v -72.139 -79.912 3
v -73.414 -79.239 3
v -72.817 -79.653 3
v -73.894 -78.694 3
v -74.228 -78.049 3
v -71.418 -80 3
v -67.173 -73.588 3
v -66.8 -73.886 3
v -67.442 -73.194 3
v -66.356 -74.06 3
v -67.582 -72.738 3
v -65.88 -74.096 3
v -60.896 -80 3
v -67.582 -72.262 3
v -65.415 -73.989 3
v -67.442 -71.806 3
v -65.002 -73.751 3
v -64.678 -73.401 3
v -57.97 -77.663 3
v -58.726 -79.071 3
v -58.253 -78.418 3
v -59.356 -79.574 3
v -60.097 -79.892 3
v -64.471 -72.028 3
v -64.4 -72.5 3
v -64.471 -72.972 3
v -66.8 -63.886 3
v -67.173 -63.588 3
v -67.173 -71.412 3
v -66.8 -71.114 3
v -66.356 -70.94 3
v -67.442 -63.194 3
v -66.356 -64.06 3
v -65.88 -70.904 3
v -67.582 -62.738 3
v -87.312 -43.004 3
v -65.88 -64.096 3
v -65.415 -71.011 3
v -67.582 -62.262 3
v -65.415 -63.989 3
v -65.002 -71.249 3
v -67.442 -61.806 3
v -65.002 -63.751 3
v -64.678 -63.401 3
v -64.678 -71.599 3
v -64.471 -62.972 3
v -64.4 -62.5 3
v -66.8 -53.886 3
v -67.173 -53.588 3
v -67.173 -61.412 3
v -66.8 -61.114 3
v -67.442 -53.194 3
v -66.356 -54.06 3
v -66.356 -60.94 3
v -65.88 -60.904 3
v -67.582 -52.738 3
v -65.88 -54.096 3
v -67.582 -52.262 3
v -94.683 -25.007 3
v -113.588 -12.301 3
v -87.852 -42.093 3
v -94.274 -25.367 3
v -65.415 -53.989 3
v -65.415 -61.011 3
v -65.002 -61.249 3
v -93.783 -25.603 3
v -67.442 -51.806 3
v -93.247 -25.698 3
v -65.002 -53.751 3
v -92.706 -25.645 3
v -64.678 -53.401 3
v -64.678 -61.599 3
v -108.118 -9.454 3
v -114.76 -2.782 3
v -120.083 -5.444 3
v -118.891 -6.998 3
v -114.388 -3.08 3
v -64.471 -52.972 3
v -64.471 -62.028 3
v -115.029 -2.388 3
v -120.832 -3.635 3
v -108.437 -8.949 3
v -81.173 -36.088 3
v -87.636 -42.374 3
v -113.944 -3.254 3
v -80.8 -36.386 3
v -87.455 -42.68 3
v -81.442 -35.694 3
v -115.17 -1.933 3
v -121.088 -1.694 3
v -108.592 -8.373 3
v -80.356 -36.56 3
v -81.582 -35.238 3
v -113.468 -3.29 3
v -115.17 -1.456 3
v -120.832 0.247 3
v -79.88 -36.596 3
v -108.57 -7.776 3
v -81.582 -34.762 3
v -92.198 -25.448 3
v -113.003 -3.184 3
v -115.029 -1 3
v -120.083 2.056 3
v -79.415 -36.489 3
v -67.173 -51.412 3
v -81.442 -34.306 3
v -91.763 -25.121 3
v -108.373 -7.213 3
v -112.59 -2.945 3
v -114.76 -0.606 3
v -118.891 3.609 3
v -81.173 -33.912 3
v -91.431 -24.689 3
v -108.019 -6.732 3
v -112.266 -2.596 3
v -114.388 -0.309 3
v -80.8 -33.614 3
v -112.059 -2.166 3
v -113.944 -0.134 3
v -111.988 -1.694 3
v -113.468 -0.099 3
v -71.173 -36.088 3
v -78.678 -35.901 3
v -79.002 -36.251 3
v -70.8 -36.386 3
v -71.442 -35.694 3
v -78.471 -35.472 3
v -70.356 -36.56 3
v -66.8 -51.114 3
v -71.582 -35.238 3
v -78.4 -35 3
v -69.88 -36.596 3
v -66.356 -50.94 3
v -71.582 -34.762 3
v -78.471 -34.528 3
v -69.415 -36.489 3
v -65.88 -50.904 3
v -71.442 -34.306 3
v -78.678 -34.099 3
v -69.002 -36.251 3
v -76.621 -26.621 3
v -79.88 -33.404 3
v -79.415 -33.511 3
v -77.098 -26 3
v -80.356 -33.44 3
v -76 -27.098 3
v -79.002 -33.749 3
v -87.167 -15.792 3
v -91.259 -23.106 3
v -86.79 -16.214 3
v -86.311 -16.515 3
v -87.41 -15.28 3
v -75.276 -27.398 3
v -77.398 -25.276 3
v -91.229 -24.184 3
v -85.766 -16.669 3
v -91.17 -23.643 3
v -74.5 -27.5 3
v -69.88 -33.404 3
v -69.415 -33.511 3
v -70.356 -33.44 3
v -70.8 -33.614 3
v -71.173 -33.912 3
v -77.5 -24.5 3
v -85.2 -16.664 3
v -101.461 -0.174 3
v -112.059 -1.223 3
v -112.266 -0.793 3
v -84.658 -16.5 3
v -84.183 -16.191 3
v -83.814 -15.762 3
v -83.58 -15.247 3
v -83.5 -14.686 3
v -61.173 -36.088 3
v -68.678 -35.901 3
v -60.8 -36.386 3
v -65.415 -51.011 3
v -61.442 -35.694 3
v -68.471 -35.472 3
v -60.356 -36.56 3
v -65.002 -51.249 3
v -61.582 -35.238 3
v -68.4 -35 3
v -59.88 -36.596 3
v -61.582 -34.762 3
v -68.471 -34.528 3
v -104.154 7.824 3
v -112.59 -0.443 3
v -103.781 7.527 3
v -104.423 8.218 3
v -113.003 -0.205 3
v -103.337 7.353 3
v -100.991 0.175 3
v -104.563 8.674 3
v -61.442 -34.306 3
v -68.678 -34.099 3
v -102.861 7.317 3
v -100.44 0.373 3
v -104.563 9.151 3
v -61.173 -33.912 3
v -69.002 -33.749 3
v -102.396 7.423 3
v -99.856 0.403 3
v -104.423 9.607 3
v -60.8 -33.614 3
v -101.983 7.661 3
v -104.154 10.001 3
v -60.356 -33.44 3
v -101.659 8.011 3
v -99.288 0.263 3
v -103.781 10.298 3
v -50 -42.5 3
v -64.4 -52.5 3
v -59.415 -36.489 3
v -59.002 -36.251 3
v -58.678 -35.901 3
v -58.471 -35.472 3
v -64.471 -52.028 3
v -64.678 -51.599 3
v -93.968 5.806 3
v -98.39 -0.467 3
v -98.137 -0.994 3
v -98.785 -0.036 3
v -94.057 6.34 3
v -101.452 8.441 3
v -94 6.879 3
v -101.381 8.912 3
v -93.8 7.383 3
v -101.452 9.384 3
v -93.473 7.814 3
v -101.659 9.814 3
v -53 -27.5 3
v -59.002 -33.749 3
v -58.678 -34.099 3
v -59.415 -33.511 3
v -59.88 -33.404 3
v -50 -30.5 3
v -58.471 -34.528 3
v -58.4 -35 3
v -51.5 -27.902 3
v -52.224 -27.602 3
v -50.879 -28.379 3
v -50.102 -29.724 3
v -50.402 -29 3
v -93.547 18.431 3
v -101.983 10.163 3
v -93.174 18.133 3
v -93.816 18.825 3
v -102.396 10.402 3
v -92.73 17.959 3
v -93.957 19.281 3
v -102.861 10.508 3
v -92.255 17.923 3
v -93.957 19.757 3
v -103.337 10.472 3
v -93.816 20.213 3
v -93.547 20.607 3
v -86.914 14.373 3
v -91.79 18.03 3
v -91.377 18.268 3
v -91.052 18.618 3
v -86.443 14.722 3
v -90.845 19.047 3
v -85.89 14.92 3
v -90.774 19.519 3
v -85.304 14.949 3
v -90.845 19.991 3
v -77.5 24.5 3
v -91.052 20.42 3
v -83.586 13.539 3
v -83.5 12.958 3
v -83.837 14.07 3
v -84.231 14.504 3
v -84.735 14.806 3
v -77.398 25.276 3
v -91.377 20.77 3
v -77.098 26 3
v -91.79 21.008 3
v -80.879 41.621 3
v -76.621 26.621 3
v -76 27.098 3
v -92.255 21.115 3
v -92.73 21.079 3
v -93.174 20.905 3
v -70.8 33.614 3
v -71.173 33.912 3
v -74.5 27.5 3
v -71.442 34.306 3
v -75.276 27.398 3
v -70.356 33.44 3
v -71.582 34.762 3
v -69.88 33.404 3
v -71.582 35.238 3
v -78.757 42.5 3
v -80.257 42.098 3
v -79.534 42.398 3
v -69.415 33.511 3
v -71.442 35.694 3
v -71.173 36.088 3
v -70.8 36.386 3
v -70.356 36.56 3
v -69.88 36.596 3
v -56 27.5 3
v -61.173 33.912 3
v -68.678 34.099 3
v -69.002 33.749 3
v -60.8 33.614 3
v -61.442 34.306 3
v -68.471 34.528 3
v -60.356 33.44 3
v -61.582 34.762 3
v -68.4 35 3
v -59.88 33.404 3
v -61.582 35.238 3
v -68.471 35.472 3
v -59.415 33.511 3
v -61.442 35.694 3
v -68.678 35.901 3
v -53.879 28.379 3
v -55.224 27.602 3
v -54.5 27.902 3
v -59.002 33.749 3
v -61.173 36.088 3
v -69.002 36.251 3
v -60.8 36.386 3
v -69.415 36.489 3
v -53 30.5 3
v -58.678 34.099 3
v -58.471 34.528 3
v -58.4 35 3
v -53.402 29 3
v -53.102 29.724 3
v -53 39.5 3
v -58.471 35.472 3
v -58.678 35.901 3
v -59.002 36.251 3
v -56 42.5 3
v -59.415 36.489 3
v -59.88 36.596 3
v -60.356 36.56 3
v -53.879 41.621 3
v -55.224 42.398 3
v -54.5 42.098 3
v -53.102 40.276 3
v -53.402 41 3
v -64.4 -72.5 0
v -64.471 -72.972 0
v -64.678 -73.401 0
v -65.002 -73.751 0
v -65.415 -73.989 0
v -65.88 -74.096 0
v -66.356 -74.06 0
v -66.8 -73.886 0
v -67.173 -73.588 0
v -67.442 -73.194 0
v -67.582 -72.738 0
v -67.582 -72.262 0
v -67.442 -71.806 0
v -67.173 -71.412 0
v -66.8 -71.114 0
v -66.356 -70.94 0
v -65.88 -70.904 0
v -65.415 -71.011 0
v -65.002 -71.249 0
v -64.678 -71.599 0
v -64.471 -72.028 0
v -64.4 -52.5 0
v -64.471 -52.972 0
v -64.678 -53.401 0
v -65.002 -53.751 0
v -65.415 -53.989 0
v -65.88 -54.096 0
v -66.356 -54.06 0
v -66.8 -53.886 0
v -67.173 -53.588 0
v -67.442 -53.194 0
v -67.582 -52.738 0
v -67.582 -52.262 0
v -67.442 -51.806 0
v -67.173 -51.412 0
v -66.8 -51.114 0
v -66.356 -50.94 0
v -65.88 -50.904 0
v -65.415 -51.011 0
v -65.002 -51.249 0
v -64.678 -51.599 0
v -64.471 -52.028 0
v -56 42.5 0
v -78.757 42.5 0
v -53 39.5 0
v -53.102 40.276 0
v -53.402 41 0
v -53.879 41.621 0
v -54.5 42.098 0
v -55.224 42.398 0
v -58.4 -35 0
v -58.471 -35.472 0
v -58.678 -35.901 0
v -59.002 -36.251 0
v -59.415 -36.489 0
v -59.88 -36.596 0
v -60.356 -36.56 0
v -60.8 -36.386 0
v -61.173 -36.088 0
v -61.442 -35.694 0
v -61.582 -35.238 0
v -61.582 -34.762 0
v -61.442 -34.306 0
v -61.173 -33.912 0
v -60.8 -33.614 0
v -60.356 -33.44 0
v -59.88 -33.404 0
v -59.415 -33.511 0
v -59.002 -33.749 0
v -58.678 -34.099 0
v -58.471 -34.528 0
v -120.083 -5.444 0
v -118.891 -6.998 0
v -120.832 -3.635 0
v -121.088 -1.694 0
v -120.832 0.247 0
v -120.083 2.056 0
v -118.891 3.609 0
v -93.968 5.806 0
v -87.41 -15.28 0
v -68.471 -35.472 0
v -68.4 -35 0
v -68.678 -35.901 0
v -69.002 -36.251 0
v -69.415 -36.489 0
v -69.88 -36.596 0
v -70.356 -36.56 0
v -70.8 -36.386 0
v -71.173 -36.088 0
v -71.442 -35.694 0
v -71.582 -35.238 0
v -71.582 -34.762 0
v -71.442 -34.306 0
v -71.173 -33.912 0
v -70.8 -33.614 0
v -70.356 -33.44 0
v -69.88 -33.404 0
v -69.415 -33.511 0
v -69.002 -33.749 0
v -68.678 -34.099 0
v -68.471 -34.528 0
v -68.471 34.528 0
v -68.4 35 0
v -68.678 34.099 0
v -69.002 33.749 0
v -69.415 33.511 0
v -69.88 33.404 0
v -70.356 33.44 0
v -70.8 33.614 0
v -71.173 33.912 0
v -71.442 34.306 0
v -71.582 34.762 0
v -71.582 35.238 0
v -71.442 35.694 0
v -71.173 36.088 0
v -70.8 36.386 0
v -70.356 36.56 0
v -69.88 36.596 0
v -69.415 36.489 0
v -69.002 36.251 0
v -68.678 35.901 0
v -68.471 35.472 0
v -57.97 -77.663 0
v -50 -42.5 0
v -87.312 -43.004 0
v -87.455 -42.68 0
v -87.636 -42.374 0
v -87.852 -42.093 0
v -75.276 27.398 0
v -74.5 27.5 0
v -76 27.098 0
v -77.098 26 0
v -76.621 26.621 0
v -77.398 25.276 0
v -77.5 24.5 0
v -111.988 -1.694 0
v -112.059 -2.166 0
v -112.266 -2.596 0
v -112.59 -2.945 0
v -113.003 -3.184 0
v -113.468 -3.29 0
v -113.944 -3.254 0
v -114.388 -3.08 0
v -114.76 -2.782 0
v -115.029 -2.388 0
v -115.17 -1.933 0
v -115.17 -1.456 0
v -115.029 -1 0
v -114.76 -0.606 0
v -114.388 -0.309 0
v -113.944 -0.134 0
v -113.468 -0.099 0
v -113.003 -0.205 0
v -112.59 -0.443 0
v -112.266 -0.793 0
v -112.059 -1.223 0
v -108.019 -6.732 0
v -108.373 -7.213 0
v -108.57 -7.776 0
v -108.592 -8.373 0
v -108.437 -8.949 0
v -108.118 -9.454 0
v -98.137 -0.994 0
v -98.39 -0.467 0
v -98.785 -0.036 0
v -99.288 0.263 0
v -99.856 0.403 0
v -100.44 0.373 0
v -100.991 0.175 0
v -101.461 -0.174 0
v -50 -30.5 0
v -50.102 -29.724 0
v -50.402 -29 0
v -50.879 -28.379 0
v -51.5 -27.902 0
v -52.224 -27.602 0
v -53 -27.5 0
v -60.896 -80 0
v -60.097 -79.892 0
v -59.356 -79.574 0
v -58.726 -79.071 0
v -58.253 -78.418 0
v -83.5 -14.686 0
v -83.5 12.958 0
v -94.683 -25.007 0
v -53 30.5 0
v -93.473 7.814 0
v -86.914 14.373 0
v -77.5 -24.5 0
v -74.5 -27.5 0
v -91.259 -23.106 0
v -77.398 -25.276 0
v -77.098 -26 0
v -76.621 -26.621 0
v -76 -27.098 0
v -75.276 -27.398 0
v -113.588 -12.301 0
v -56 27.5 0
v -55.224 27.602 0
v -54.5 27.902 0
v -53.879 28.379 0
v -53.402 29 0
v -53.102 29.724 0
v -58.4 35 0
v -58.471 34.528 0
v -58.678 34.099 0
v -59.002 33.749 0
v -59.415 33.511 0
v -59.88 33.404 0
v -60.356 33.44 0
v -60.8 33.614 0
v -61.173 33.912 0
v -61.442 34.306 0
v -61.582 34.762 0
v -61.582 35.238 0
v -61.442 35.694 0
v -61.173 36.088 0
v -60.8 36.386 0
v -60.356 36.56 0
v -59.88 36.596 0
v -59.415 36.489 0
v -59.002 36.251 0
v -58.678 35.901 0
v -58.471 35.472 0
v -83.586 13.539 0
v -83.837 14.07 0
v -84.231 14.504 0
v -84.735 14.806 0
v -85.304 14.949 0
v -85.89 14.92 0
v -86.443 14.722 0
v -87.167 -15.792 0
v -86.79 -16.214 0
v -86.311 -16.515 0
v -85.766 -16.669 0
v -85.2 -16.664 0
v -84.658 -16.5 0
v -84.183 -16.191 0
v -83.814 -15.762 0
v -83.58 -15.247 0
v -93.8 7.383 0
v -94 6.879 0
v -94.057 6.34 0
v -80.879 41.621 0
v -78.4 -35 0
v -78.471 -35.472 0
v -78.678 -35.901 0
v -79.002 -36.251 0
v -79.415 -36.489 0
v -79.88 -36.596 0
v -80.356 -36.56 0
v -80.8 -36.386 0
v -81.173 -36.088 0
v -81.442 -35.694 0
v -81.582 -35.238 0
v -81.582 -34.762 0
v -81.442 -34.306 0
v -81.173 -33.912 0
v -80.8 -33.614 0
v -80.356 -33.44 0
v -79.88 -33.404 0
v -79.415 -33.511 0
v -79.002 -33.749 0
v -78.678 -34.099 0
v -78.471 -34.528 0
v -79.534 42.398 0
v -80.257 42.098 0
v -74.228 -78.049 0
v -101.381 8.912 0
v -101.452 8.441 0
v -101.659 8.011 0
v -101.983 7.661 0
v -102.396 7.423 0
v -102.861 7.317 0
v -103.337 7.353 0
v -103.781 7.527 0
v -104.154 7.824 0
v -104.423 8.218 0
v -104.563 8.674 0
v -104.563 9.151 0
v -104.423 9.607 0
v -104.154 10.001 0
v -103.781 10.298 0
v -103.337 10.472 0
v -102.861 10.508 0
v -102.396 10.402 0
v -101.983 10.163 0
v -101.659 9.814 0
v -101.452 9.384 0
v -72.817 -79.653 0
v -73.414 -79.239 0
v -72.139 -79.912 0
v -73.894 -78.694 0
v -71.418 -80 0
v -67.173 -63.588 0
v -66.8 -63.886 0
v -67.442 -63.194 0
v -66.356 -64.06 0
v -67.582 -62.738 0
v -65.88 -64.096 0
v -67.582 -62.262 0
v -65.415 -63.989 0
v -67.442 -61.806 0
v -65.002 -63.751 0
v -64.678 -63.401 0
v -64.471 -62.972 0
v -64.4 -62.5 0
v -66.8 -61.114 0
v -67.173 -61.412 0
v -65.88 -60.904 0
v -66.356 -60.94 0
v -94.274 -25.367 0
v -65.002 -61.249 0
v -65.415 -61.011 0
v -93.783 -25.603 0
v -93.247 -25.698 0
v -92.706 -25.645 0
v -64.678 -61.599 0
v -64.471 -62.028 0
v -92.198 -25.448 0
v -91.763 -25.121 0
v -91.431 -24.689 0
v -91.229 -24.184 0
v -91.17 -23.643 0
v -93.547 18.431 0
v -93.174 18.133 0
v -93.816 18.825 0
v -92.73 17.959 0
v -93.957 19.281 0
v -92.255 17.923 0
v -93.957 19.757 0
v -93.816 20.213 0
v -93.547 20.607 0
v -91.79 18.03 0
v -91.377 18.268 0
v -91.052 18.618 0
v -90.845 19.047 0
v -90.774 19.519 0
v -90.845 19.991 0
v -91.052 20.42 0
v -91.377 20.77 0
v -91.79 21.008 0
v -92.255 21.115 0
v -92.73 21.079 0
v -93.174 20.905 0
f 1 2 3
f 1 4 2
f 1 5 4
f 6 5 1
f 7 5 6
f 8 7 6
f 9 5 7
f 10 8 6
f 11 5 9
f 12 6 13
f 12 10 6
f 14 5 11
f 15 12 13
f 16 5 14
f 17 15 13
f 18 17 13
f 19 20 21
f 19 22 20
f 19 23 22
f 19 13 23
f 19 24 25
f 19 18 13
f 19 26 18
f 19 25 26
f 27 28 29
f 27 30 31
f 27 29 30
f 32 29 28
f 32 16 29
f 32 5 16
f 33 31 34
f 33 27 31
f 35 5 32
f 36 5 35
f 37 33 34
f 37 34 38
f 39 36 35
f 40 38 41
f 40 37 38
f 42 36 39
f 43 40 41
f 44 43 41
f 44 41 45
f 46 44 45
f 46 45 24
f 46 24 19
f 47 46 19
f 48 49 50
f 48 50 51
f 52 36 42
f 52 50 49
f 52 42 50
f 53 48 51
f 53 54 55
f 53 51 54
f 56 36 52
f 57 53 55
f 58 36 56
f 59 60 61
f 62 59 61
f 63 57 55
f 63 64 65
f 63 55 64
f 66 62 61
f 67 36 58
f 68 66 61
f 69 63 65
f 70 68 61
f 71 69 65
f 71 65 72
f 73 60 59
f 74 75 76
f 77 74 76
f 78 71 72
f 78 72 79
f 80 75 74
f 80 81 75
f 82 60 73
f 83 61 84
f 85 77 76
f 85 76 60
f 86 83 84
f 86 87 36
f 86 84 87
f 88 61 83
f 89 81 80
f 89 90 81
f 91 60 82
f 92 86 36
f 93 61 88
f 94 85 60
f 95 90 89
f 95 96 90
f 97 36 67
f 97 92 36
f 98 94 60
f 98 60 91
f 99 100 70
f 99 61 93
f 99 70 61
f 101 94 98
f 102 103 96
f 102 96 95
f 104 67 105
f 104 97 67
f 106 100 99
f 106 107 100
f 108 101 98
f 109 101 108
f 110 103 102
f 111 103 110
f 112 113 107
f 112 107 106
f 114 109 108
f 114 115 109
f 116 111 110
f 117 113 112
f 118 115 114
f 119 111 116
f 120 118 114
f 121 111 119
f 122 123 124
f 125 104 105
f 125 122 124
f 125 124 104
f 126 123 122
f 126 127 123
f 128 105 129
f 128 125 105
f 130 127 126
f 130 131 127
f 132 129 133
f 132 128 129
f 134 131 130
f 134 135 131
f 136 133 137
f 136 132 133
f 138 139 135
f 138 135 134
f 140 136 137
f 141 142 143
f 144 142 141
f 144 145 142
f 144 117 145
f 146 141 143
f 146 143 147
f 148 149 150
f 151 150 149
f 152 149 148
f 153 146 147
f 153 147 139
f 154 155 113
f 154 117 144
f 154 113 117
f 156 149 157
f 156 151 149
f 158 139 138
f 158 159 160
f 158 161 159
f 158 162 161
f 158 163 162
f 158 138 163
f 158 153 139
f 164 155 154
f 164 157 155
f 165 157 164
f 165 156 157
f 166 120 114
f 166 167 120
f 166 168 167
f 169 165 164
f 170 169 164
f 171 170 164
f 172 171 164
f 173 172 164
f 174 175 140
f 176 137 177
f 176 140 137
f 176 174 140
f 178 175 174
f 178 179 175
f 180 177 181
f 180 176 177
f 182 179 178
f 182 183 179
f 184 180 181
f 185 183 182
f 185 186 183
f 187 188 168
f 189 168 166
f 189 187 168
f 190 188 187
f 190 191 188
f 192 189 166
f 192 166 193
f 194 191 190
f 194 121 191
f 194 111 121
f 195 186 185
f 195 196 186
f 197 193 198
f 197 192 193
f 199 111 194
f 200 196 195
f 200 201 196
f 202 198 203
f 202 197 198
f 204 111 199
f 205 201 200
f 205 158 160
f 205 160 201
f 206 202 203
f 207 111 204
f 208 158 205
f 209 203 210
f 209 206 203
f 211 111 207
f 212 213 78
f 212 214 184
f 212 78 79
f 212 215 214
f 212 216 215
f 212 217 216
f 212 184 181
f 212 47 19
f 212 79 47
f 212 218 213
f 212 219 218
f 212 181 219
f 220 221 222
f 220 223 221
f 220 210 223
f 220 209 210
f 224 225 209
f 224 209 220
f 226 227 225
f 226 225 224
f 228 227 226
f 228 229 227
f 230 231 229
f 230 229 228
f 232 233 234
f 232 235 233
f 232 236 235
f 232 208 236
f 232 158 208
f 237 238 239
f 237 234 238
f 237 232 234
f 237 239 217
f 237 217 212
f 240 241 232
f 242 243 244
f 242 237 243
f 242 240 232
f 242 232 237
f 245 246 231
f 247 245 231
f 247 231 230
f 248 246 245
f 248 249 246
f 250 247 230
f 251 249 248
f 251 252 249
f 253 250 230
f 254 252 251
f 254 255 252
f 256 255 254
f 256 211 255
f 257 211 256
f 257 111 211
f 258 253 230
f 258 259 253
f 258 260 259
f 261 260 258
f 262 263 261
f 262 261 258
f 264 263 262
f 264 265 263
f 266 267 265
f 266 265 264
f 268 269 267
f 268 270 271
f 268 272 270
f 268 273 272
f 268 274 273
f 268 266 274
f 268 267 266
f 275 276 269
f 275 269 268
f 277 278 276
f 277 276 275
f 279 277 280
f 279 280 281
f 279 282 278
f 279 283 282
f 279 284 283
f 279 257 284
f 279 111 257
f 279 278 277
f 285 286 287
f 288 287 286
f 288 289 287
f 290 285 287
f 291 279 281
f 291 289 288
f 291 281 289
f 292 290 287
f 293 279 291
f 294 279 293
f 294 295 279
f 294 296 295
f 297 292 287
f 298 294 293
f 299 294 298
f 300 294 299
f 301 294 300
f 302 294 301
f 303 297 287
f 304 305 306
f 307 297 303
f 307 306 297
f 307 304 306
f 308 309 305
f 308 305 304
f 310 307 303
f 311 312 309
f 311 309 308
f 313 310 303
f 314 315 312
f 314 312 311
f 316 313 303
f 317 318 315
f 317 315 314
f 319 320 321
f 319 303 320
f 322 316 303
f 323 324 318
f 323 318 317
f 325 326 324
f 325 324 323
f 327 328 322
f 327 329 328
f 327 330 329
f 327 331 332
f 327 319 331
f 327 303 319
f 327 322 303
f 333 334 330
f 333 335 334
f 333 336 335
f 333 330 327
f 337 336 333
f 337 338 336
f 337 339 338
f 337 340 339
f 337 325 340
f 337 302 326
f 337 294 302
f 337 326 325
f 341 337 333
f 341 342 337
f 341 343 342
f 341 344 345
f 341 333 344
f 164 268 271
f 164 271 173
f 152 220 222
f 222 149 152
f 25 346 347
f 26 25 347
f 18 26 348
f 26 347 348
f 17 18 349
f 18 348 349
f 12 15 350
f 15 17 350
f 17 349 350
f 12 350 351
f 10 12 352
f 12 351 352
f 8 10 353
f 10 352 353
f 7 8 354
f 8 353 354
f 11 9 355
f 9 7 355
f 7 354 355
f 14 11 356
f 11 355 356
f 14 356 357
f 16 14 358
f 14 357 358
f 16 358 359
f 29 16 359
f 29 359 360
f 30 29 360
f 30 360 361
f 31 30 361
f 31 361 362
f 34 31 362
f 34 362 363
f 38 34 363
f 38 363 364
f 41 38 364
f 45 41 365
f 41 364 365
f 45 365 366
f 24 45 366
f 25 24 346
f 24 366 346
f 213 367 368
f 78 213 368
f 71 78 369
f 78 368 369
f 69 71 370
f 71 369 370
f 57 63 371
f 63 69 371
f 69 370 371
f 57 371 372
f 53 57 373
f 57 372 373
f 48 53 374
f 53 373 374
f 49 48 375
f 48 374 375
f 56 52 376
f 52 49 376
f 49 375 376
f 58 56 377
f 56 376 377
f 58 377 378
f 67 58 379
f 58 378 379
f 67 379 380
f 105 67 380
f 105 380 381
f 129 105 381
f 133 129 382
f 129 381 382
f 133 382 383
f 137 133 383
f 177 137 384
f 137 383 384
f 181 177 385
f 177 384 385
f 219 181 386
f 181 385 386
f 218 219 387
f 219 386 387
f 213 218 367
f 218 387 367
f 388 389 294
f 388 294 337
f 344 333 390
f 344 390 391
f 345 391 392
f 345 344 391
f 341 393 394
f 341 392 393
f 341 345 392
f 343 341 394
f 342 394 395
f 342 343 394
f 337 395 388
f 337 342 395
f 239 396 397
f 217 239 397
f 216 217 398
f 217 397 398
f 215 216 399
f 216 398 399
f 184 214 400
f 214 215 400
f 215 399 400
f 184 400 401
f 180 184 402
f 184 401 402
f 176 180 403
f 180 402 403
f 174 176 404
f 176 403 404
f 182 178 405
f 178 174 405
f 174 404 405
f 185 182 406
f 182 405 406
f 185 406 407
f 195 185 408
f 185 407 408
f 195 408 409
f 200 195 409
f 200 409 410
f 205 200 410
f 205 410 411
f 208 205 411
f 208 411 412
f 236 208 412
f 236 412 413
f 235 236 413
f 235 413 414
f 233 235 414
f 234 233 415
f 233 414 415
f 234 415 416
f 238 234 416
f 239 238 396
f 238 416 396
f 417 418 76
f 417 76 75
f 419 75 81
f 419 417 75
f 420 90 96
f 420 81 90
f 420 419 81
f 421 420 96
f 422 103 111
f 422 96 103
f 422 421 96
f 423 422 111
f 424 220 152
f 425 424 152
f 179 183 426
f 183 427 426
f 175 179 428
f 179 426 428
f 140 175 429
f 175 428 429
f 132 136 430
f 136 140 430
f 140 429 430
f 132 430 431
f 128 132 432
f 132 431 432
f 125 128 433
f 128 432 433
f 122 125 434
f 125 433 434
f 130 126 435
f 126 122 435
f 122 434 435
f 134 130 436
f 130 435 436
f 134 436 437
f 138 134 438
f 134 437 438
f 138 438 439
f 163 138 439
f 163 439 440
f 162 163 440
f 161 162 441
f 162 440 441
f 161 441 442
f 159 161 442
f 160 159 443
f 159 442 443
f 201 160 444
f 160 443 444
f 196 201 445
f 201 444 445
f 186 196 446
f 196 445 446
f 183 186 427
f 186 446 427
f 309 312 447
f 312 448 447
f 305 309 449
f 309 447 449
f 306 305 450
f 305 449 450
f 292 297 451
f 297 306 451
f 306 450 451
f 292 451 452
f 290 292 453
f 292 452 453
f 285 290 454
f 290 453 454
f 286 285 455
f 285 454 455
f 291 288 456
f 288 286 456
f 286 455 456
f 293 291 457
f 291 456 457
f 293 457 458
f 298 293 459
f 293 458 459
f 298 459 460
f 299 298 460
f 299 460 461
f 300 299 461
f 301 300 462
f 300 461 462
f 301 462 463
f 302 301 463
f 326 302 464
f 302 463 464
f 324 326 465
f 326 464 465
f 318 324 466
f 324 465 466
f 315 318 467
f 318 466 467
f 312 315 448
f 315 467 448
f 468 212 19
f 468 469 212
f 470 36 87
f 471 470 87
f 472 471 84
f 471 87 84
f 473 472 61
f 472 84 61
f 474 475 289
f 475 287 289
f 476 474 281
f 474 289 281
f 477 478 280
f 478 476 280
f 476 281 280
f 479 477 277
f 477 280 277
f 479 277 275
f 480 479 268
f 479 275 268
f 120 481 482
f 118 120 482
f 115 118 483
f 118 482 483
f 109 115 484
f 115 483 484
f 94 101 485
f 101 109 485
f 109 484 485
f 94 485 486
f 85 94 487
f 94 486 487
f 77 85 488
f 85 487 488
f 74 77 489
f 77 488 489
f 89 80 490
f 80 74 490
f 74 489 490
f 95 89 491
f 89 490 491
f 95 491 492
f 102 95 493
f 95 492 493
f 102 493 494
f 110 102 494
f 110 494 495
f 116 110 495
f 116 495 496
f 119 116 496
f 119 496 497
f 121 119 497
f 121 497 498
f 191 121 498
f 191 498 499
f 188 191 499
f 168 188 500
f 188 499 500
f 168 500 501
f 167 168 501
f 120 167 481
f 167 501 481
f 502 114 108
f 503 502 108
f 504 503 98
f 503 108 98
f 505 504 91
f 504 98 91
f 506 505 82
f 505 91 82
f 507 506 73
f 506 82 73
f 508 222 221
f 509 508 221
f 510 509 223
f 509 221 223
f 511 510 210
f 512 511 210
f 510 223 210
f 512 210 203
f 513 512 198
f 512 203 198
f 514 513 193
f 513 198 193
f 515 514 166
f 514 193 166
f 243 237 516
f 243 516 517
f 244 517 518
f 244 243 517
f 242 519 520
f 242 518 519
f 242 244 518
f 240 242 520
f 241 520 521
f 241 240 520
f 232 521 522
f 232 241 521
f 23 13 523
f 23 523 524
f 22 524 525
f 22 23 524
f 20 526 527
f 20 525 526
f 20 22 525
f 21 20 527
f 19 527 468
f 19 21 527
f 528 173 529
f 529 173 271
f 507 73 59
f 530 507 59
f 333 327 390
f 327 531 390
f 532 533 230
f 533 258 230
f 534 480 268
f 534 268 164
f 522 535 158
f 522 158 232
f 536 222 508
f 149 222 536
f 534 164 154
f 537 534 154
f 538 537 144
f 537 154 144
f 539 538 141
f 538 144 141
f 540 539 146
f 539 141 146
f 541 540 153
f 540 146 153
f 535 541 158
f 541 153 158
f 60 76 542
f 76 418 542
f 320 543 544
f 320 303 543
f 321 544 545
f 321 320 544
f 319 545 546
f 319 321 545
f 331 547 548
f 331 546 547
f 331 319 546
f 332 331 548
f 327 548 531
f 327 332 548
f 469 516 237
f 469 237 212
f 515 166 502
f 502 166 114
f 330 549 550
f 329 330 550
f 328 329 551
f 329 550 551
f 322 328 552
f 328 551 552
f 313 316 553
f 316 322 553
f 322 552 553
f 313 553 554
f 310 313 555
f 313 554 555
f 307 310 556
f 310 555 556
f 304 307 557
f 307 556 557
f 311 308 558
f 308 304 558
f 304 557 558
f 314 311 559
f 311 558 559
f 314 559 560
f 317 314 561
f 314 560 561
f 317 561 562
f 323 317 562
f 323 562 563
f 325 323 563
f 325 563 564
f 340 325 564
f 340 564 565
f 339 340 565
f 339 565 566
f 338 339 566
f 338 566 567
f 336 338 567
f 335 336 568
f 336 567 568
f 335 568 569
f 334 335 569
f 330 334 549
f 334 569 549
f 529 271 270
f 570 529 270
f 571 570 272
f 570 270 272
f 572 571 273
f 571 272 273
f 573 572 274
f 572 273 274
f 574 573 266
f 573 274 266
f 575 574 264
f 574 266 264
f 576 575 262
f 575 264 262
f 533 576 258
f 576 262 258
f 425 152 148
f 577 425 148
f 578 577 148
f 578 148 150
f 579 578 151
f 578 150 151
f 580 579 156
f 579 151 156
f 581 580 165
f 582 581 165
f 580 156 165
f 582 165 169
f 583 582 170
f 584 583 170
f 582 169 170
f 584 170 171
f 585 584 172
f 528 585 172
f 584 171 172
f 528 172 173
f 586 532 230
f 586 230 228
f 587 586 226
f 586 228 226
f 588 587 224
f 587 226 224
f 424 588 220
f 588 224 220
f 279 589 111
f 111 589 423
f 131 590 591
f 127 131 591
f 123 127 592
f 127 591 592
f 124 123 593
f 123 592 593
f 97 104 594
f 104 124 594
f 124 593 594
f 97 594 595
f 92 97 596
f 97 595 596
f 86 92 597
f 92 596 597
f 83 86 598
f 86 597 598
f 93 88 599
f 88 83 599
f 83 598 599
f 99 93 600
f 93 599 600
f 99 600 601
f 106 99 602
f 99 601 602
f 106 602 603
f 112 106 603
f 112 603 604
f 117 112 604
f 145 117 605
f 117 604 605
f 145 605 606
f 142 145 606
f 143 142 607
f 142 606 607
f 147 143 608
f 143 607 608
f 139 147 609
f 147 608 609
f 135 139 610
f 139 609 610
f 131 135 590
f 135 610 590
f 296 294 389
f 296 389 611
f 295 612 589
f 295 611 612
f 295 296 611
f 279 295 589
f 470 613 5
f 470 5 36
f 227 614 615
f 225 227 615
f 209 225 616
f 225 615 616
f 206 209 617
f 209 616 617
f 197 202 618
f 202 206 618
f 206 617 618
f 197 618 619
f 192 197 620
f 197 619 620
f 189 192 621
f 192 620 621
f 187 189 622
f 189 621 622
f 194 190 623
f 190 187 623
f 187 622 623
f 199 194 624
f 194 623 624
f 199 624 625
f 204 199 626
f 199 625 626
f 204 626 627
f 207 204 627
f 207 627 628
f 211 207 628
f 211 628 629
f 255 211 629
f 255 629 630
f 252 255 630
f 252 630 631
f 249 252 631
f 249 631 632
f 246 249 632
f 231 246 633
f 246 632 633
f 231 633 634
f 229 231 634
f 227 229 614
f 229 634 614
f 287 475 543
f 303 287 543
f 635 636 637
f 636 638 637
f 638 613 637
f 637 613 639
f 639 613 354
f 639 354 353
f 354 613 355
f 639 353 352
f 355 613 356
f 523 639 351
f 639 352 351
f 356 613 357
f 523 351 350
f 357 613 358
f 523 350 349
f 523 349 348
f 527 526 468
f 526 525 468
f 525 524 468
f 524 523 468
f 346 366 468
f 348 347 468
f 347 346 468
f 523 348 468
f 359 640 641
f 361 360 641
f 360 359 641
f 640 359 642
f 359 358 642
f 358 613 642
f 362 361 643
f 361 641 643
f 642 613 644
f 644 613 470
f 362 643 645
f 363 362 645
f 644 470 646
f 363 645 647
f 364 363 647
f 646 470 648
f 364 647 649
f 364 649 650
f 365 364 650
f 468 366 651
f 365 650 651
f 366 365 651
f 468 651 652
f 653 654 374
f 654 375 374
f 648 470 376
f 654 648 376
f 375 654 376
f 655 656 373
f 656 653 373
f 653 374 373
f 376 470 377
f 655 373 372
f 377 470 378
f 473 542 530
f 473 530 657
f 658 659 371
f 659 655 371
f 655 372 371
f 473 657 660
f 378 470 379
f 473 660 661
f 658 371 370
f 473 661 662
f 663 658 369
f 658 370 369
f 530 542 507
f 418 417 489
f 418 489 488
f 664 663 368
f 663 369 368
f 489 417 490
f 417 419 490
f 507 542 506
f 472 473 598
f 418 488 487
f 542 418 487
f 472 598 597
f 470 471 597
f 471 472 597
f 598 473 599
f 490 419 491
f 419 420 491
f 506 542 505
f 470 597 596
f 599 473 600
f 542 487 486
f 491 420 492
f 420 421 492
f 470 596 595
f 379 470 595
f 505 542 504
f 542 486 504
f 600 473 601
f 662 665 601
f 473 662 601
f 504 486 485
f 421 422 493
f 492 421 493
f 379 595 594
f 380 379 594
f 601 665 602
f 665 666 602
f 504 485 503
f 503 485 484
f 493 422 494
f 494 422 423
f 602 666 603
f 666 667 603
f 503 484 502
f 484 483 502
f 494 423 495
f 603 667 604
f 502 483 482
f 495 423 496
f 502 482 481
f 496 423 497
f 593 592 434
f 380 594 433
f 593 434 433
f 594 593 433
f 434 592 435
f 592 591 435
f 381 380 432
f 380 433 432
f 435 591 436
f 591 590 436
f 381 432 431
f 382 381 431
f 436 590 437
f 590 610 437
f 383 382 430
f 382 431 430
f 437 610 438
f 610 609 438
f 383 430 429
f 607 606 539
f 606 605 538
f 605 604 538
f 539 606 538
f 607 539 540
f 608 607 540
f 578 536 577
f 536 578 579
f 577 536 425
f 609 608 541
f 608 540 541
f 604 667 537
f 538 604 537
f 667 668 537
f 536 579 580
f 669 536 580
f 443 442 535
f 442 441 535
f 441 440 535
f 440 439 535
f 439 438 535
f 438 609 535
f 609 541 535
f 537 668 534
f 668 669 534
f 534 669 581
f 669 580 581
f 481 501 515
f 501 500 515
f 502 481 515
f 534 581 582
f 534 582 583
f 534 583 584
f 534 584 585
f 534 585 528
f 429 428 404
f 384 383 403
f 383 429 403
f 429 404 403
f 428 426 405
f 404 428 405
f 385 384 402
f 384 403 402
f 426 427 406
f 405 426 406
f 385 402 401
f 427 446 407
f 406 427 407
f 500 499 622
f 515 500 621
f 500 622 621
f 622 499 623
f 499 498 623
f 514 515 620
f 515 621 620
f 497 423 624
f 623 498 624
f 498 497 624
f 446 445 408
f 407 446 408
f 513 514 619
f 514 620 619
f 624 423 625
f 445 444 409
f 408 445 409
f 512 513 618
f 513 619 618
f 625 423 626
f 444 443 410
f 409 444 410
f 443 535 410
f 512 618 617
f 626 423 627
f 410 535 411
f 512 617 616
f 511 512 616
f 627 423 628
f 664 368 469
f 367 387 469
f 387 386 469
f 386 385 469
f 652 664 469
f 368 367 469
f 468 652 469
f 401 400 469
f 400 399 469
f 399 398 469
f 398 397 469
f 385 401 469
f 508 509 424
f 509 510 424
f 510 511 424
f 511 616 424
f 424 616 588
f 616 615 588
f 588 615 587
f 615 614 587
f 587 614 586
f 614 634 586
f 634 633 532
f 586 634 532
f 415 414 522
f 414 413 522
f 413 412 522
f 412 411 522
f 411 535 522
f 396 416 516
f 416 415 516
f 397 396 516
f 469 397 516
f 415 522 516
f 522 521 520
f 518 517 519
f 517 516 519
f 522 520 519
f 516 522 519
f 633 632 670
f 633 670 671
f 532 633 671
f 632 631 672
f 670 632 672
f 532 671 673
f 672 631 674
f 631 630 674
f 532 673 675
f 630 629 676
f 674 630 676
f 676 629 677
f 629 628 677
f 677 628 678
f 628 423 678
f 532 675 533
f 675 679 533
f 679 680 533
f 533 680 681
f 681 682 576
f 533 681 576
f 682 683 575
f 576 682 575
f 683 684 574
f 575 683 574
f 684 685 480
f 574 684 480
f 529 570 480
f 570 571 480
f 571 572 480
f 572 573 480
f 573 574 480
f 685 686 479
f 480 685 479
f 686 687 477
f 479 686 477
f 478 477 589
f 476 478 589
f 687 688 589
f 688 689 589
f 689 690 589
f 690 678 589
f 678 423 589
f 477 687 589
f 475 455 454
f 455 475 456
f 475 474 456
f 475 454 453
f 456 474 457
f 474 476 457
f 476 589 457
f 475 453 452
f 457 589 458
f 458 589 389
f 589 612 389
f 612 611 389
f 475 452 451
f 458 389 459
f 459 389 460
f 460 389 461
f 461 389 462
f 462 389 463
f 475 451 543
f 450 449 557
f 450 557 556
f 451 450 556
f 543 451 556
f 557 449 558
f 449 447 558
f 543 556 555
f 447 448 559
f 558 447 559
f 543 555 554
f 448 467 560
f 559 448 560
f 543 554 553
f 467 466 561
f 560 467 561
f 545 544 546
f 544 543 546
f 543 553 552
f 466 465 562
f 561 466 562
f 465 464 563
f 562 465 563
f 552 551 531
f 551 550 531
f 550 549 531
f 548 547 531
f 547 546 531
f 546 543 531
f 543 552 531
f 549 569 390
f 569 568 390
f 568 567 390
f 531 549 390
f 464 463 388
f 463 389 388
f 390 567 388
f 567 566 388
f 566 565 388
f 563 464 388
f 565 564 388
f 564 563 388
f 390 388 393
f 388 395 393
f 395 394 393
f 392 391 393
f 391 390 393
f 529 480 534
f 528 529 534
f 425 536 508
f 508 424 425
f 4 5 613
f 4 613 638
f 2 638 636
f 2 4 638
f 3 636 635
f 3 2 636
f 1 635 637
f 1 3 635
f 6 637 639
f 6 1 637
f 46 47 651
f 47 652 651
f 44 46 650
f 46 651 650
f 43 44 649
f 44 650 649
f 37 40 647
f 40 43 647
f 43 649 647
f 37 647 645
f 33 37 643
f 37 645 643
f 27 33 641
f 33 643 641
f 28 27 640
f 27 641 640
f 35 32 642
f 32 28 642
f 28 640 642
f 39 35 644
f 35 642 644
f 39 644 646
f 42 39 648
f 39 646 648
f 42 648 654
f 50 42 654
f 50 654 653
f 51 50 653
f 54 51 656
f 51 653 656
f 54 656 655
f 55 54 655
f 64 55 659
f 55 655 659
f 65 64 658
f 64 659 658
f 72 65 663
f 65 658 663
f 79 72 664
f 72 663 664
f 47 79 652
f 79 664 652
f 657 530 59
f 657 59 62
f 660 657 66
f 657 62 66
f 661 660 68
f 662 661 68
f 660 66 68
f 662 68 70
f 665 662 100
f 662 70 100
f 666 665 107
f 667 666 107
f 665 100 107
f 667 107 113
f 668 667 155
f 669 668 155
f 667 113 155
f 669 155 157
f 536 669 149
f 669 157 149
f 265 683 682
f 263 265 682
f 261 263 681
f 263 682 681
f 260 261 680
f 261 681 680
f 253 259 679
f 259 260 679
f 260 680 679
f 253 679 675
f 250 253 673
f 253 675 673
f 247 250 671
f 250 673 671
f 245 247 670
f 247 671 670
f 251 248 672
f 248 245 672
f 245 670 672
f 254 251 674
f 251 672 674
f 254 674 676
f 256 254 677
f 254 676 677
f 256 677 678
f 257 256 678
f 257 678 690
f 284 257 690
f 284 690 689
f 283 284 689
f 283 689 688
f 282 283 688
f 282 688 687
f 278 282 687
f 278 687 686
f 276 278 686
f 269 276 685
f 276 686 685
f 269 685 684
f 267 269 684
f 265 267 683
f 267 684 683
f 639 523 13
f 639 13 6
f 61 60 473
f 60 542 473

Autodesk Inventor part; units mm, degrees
ref_plane "YZ Plane" through (0, 0, 0) normal (1, 0, 0) x (0, 1, 0)
ref_plane "XZ Plane" through (0, 0, 0) normal (0, 1, 0) x (-1, 0, 0)
ref_plane "XY Plane" through (0, 0, 0) normal (0, 0, 1) x (1, 0, 0)
sketch "スケッチ1" plane through (0, 0, 0) normal (0, 0, 1) x (1, 0, 0)
  line L0 (67.5, 17.5) -> (-67.5, 17.5) construction
  line L1 (-67.5, 17.5) -> (-67.5, -17.5) construction
  line L2 (-67.5, -17.5) -> (67.5, -17.5) construction
  line L3 (67.5, -17.5) -> (67.5, 17.5) construction
  line L4 (67.5, 17.5) -> (-67.5, -17.5) construction
  line L5 (-67.5, 17.5) -> (67.5, -17.5) construction
  circle A0 centre (-60, 35) radius 1.6
  circle A1 centre (-70, 35) radius 1.6
  line L6 (-77.5, 27.5) -> (-53, 27.5)
  line L7 (-53, 27.5) -> (-53, 42.5)
  line L8 (-53, 42.5) -> (-80, 42.5) construction
  line L9 (-77.5, 27.5) -> (-77.5, -27.5)
  line L10 (-77.5, -27.5) -> (-50, -27.5)
  circle A2 centre (-60, -35) radius 1.6
  circle A3 centre (-70, -35) radius 1.6
  circle A4 centre (-80, -35) radius 1.6
  line L11 (124.2308, -31.7536) -> (484.5935, -392.1164)
  line L12 (484.5935, -392.1164) -> (488.7129, -553.575)
  line L13 (-80, 21.2868) -> (-468.838, -367.5512) construction
  line L14 (-468.838, -367.5512) -> (-479.4446, -356.9446)
  line L15 (-479.4446, -356.9446) -> (-90.6066, 31.8934) construction
  line L16 (-90.6066, 31.8934) -> (-80, 21.2868) construction
  line L17 (-80, 42.5) -> (-80, 5.3052) construction
  circle A5 centre (-92.3744, 19.519) radius 1.6
  circle A6 centre (-102.981, 8.9124) radius 1.6
  circle A7 centre (-113.5876, -1.6942) radius 1.6
  line L18 (-92.3744, 19.519) -> (-113.5876, -1.6942) construction
  circle A8 centre (-433.75, -321.8566) radius 1.6
  circle A9 centre (-421.9492, -310.0558) radius 1.6
  line L19 (-388.4374, -772.2067) -> (-358.1265, -754.7067) construction
  line L20 (-358.1265, -754.7067) -> (-425.6265, -637.7933) construction
  line L21 (-455.9374, -655.2933) -> (-358.1265, -754.7067) construction
  line L22 (-388.4374, -772.2067) -> (-425.6265, -637.7933) construction
  line L23 (-455.9374, -655.2933) -> (-388.4374, -772.2067) construction
  line L24 (-425.6265, -637.7933) -> (-455.9374, -655.2933) construction
  line L25 (455.9374, -655.2933) -> (425.6265, -637.7933) construction
  line L26 (425.6265, -637.7933) -> (358.1265, -754.7067) construction
  line L27 (388.4374, -772.2067) -> (425.6265, -637.7933) construction
  line L28 (455.9374, -655.2933) -> (358.1265, -754.7067) construction
  line L29 (388.4374, -772.2067) -> (455.9374, -655.2933) construction
  line L30 (358.1265, -754.7067) -> (388.4374, -772.2067) construction
  line L31 (0, 0) -> (0, -263.4473) construction
  line L32 (67.5, 17.5) -> (67.5, -17.5) construction
  circle A10 centre (60, 35) radius 1.6
  circle A11 centre (70, 35) radius 1.6
  line L33 (77.5, 27.5) -> (53, 27.5)
  line L34 (53, 27.5) -> (53, 42.5)
  line L35 (53, 42.5) -> (80, 42.5)
  line L36 (77.5, 27.5) -> (77.5, -27.5)
  line L37 (77.5, -27.5) -> (50, -27.5)
  line L38 (50, -27.5) -> (72.3664, -42.5)
  line L39 (72.3664, -42.5) -> (99.3664, -42.5)
  circle A12 centre (60, -35) radius 1.6
  circle A13 centre (70, -35) radius 1.6
  circle A14 centre (80, -35) radius 1.6
  line L40 (80, 42.5) -> (80, 5.3052) construction
  line L41 (-483.838, -367.5512) -> (-468.838, -367.5512)
  line L42 (-468.838, -367.5512) -> (-468.838, -648.3077)
  line L43 (-468.838, -648.3077) -> (-483.838, -648.3077)
  line L44 (-483.838, -648.3077) -> (-483.838, -367.5512)
  line L45 (-283.2277, -604.4352) -> (-262.2277, -640.8083) construction
  line L46 (345.2492, -497.0108) -> (305.7786, -565.3759) construction
  line L47 (265.1134, -631.6538) -> (-234.8866, -631.6538) construction
  line L48 (-234.8866, -631.6538) -> (-234.8866, -1131.6538) construction
  line L49 (-234.8866, -1131.6538) -> (265.1134, -1131.6538) construction
  line L50 (265.1134, -1131.6538) -> (265.1134, -631.6538) construction
  line L51 (265.1134, -631.6538) -> (-234.8866, -1131.6538) construction
  line L52 (-234.8866, -631.6538) -> (265.1134, -1131.6538) construction
  line L53 (-12.841, -157.5) -> (15.1134, -157.5) construction
  circle A15 centre (1.1362, -409.4569) radius 212.5 construction
  line L54 (501.1362, 53.616) -> (-498.8638, 53.616) construction
  line L55 (-498.8638, 53.616) -> (-498.8638, -946.384) construction
  line L56 (-498.8638, -946.384) -> (501.1362, -946.384) construction
  line L57 (501.1362, -946.384) -> (501.1362, 53.616) construction
  line L58 (501.1362, 53.616) -> (-498.8638, -946.384) construction
  line L59 (-498.8638, 53.616) -> (501.1362, -946.384) construction
  circle A16 centre (1.1362, -409.4569) radius 250 construction
  line L60 (-80, 42.5) -> (-90.6066, 31.8934) construction
  line L61 (-80, 42.5) -> (-118.8909, 3.6091)
  line L62 (-118.8909, -6.9975) -> (-113.5876, -12.3008)
  line L63 (-113.5876, -12.3008) -> (-87.5, -42.5)
  arc A17 (-118.8909, 3.6091) -> (-118.8909, -6.9975) centre (-113.5876, -1.6942) ccw
  line L64 (-80, 42.5) -> (-53, 42.5)
  circle A18 centre (-66, -52.5) radius 1.6
  circle A19 centre (-66, -62.5) radius 1.6
  circle A20 centre (-66, -72.5) radius 1.6
  line L65 (-58.5, -80) -> (-73.5, -80)
  line L66 (-73.5, -80) -> (-87.5, -42.5)
  line L67 (-50, -27.5) -> (-50, -42.5)
  line L68 (-50, -42.5) -> (-58.5, -80)
  point P0 (0, -470)
  point P1 (-102.981, 8.9124)
  point P2 (-77.5, 0)
  point P3 (-407.0319, -705)
  point P4 (-407.0319, -705)
  point P5 (407.0319, -705)
  point P6 (407.0319, -705)
  point P7 (77.5, 0)
  point P8 (15.1134, -881.6538)
  point P9 (1.1362, -446.384)
  point P10 (-124.1942, -1.6942)
  dimension "d27" = 135
  dimension "d28" = 35
  dimension "d29" = 3.2
  dimension "d30" = 3.2
  dimension "d31" = 10
  dimension "d32" = 15
  dimension "d33" = 10
  dimension "d34" = 7.5
  dimension "d35" = 7
  dimension "d36" = 70
  dimension "d37" = 3.2
  dimension "d38" = 3.2
  dimension "d39" = 3.2
  dimension "d40" = 10
  dimension "d41" = 10
  dimension "d45" = 10
  dimension "d46" = 10
  dimension "d53" = 135
  dimension "d54" = 15
  dimension "d55" = 10
  dimension "d57" = 3.2
  dimension "d58" = 3.2
  dimension "d59" = 3.2
  dimension "d60" = 10
  dimension "d61" = 15
  dimension "d62" = 15
  dimension "d63" = 7.5
  dimension "d64" = 45
  dimension "d65" = 3.2
  dimension "d66" = 3.2
  dimension "d69" = 360
  dimension "d76" = 470
  dimension "d77" = 15
  dimension "d80" = 500
  dimension "d81" = 500
  dimension "d82" = 200
  dimension "d83" = 425
  dimension "d84" = 1000
  dimension "d85" = 1000
  dimension "d88" = 42
  dimension "d89" = 500
  dimension "d90" = 7.5
  dimension "d91" = 7.5
  dimension "d112" = 3.2
  dimension "d113" = 3.2
  dimension "d114" = 3.2
  dimension "d115" = 10
  dimension "d116" = 10
  dimension "d117" = 25
  dimension "d118" = 66
  dimension "d120" = 7.5
  dimension "d121" = 7.5
  dimension "d122" = 7.5
  dimension "d123" = 7.5
  dimension "d124" = 7.5
  dimension "d129" = 10
  dimension "d130" = 7.5
  dimension "d131" = 7.5
extrude "押し出し1" add sketch "スケッチ1" along normal blind 3 contours L9 L10 L67 L68 L65 L66 L63 L62 A17 L61 L64 L7 L6
fillet "フィレット1" radius 3 10 edges at (-113.5876, -12.3008, 1.5) (-50, -27.5, 1.5) (-77.5, -27.5, 1.5) (-77.5, 27.5, 1.5) (-53, 27.5, 1.5) (-53, 42.5, 1.5) (-80, 42.5, 1.5) (-87.5, -42.5, 1.5) (-73.5, -80, 1.5) (-58.5, -80, 1.5)
sketch "スケッチ2" plane through (0, 0, 3) normal (0, 0, 1) x (1, 0, 0)
  line L0 (-108.1182, -9.4538) -> (-94.6826, -25.0069)
  line L1 (-83.5, -14.6862) -> (-83.5, 12.9584)
  line L2 (-86.9142, 14.3726) -> (-93.4726, 7.8142)
  line L3 (-77.5, -24.5) -> (-77.5, 24.5) projected
  line L4 (-80.8787, 41.6213) -> (-118.8909, 3.6091) projected
  line L5 (-113.516, -12.3836) -> (-87.852, -42.0925) projected
  line L6 (-96.7234, 4.5634) -> (-83.5, -37.9521) construction
  line L7 (-98.1366, -0.994) -> (-91.2594, -23.1055)
  line L8 (-93.9681, 5.806) -> (-87.4098, -15.2802)
  line L9 (-101.4606, -0.1738) -> (-108.019, -6.7322)
  arc A0 (-98.1366, -0.994) -> (-101.4606, -0.1738) centre (-100.0464, -1.588) ccw
  arc A1 (-93.4726, 7.8142) -> (-93.9681, 5.806) centre (-92.0583, 6.4) ccw
  arc A2 (-94.6826, -25.0069) -> (-91.2594, -23.1055) centre (-93.1692, -23.6995) ccw
  arc A3 (-87.4098, -15.2802) -> (-83.5, -14.6862) centre (-85.5, -14.6862) ccw
  arc A4 (-83.5, 12.9584) -> (-86.9142, 14.3726) centre (-85.5, 12.9584) ccw
  arc A5 (-108.019, -6.7322) -> (-108.1182, -9.4538) centre (-106.6047, -8.1464) ccw
  line L10 (-53, -27.5) -> (-74.5, -27.5) projected
  point P0 (0, 0)
  point P1 (-99.1198, 2.167)
  dimension "d95" = 6
  dimension "d97" = 15
  dimension "d98" = 6
  dimension "d99" = 3
  dimension "d100" = 3
  dimension "d101" = 2
  dimension "d102" = 2
extrude "押し出し2" cut sketch "スケッチ2" against normal blind 3
properties part number "オムニ_後ろ側板" material "アルミニウム 6061"
